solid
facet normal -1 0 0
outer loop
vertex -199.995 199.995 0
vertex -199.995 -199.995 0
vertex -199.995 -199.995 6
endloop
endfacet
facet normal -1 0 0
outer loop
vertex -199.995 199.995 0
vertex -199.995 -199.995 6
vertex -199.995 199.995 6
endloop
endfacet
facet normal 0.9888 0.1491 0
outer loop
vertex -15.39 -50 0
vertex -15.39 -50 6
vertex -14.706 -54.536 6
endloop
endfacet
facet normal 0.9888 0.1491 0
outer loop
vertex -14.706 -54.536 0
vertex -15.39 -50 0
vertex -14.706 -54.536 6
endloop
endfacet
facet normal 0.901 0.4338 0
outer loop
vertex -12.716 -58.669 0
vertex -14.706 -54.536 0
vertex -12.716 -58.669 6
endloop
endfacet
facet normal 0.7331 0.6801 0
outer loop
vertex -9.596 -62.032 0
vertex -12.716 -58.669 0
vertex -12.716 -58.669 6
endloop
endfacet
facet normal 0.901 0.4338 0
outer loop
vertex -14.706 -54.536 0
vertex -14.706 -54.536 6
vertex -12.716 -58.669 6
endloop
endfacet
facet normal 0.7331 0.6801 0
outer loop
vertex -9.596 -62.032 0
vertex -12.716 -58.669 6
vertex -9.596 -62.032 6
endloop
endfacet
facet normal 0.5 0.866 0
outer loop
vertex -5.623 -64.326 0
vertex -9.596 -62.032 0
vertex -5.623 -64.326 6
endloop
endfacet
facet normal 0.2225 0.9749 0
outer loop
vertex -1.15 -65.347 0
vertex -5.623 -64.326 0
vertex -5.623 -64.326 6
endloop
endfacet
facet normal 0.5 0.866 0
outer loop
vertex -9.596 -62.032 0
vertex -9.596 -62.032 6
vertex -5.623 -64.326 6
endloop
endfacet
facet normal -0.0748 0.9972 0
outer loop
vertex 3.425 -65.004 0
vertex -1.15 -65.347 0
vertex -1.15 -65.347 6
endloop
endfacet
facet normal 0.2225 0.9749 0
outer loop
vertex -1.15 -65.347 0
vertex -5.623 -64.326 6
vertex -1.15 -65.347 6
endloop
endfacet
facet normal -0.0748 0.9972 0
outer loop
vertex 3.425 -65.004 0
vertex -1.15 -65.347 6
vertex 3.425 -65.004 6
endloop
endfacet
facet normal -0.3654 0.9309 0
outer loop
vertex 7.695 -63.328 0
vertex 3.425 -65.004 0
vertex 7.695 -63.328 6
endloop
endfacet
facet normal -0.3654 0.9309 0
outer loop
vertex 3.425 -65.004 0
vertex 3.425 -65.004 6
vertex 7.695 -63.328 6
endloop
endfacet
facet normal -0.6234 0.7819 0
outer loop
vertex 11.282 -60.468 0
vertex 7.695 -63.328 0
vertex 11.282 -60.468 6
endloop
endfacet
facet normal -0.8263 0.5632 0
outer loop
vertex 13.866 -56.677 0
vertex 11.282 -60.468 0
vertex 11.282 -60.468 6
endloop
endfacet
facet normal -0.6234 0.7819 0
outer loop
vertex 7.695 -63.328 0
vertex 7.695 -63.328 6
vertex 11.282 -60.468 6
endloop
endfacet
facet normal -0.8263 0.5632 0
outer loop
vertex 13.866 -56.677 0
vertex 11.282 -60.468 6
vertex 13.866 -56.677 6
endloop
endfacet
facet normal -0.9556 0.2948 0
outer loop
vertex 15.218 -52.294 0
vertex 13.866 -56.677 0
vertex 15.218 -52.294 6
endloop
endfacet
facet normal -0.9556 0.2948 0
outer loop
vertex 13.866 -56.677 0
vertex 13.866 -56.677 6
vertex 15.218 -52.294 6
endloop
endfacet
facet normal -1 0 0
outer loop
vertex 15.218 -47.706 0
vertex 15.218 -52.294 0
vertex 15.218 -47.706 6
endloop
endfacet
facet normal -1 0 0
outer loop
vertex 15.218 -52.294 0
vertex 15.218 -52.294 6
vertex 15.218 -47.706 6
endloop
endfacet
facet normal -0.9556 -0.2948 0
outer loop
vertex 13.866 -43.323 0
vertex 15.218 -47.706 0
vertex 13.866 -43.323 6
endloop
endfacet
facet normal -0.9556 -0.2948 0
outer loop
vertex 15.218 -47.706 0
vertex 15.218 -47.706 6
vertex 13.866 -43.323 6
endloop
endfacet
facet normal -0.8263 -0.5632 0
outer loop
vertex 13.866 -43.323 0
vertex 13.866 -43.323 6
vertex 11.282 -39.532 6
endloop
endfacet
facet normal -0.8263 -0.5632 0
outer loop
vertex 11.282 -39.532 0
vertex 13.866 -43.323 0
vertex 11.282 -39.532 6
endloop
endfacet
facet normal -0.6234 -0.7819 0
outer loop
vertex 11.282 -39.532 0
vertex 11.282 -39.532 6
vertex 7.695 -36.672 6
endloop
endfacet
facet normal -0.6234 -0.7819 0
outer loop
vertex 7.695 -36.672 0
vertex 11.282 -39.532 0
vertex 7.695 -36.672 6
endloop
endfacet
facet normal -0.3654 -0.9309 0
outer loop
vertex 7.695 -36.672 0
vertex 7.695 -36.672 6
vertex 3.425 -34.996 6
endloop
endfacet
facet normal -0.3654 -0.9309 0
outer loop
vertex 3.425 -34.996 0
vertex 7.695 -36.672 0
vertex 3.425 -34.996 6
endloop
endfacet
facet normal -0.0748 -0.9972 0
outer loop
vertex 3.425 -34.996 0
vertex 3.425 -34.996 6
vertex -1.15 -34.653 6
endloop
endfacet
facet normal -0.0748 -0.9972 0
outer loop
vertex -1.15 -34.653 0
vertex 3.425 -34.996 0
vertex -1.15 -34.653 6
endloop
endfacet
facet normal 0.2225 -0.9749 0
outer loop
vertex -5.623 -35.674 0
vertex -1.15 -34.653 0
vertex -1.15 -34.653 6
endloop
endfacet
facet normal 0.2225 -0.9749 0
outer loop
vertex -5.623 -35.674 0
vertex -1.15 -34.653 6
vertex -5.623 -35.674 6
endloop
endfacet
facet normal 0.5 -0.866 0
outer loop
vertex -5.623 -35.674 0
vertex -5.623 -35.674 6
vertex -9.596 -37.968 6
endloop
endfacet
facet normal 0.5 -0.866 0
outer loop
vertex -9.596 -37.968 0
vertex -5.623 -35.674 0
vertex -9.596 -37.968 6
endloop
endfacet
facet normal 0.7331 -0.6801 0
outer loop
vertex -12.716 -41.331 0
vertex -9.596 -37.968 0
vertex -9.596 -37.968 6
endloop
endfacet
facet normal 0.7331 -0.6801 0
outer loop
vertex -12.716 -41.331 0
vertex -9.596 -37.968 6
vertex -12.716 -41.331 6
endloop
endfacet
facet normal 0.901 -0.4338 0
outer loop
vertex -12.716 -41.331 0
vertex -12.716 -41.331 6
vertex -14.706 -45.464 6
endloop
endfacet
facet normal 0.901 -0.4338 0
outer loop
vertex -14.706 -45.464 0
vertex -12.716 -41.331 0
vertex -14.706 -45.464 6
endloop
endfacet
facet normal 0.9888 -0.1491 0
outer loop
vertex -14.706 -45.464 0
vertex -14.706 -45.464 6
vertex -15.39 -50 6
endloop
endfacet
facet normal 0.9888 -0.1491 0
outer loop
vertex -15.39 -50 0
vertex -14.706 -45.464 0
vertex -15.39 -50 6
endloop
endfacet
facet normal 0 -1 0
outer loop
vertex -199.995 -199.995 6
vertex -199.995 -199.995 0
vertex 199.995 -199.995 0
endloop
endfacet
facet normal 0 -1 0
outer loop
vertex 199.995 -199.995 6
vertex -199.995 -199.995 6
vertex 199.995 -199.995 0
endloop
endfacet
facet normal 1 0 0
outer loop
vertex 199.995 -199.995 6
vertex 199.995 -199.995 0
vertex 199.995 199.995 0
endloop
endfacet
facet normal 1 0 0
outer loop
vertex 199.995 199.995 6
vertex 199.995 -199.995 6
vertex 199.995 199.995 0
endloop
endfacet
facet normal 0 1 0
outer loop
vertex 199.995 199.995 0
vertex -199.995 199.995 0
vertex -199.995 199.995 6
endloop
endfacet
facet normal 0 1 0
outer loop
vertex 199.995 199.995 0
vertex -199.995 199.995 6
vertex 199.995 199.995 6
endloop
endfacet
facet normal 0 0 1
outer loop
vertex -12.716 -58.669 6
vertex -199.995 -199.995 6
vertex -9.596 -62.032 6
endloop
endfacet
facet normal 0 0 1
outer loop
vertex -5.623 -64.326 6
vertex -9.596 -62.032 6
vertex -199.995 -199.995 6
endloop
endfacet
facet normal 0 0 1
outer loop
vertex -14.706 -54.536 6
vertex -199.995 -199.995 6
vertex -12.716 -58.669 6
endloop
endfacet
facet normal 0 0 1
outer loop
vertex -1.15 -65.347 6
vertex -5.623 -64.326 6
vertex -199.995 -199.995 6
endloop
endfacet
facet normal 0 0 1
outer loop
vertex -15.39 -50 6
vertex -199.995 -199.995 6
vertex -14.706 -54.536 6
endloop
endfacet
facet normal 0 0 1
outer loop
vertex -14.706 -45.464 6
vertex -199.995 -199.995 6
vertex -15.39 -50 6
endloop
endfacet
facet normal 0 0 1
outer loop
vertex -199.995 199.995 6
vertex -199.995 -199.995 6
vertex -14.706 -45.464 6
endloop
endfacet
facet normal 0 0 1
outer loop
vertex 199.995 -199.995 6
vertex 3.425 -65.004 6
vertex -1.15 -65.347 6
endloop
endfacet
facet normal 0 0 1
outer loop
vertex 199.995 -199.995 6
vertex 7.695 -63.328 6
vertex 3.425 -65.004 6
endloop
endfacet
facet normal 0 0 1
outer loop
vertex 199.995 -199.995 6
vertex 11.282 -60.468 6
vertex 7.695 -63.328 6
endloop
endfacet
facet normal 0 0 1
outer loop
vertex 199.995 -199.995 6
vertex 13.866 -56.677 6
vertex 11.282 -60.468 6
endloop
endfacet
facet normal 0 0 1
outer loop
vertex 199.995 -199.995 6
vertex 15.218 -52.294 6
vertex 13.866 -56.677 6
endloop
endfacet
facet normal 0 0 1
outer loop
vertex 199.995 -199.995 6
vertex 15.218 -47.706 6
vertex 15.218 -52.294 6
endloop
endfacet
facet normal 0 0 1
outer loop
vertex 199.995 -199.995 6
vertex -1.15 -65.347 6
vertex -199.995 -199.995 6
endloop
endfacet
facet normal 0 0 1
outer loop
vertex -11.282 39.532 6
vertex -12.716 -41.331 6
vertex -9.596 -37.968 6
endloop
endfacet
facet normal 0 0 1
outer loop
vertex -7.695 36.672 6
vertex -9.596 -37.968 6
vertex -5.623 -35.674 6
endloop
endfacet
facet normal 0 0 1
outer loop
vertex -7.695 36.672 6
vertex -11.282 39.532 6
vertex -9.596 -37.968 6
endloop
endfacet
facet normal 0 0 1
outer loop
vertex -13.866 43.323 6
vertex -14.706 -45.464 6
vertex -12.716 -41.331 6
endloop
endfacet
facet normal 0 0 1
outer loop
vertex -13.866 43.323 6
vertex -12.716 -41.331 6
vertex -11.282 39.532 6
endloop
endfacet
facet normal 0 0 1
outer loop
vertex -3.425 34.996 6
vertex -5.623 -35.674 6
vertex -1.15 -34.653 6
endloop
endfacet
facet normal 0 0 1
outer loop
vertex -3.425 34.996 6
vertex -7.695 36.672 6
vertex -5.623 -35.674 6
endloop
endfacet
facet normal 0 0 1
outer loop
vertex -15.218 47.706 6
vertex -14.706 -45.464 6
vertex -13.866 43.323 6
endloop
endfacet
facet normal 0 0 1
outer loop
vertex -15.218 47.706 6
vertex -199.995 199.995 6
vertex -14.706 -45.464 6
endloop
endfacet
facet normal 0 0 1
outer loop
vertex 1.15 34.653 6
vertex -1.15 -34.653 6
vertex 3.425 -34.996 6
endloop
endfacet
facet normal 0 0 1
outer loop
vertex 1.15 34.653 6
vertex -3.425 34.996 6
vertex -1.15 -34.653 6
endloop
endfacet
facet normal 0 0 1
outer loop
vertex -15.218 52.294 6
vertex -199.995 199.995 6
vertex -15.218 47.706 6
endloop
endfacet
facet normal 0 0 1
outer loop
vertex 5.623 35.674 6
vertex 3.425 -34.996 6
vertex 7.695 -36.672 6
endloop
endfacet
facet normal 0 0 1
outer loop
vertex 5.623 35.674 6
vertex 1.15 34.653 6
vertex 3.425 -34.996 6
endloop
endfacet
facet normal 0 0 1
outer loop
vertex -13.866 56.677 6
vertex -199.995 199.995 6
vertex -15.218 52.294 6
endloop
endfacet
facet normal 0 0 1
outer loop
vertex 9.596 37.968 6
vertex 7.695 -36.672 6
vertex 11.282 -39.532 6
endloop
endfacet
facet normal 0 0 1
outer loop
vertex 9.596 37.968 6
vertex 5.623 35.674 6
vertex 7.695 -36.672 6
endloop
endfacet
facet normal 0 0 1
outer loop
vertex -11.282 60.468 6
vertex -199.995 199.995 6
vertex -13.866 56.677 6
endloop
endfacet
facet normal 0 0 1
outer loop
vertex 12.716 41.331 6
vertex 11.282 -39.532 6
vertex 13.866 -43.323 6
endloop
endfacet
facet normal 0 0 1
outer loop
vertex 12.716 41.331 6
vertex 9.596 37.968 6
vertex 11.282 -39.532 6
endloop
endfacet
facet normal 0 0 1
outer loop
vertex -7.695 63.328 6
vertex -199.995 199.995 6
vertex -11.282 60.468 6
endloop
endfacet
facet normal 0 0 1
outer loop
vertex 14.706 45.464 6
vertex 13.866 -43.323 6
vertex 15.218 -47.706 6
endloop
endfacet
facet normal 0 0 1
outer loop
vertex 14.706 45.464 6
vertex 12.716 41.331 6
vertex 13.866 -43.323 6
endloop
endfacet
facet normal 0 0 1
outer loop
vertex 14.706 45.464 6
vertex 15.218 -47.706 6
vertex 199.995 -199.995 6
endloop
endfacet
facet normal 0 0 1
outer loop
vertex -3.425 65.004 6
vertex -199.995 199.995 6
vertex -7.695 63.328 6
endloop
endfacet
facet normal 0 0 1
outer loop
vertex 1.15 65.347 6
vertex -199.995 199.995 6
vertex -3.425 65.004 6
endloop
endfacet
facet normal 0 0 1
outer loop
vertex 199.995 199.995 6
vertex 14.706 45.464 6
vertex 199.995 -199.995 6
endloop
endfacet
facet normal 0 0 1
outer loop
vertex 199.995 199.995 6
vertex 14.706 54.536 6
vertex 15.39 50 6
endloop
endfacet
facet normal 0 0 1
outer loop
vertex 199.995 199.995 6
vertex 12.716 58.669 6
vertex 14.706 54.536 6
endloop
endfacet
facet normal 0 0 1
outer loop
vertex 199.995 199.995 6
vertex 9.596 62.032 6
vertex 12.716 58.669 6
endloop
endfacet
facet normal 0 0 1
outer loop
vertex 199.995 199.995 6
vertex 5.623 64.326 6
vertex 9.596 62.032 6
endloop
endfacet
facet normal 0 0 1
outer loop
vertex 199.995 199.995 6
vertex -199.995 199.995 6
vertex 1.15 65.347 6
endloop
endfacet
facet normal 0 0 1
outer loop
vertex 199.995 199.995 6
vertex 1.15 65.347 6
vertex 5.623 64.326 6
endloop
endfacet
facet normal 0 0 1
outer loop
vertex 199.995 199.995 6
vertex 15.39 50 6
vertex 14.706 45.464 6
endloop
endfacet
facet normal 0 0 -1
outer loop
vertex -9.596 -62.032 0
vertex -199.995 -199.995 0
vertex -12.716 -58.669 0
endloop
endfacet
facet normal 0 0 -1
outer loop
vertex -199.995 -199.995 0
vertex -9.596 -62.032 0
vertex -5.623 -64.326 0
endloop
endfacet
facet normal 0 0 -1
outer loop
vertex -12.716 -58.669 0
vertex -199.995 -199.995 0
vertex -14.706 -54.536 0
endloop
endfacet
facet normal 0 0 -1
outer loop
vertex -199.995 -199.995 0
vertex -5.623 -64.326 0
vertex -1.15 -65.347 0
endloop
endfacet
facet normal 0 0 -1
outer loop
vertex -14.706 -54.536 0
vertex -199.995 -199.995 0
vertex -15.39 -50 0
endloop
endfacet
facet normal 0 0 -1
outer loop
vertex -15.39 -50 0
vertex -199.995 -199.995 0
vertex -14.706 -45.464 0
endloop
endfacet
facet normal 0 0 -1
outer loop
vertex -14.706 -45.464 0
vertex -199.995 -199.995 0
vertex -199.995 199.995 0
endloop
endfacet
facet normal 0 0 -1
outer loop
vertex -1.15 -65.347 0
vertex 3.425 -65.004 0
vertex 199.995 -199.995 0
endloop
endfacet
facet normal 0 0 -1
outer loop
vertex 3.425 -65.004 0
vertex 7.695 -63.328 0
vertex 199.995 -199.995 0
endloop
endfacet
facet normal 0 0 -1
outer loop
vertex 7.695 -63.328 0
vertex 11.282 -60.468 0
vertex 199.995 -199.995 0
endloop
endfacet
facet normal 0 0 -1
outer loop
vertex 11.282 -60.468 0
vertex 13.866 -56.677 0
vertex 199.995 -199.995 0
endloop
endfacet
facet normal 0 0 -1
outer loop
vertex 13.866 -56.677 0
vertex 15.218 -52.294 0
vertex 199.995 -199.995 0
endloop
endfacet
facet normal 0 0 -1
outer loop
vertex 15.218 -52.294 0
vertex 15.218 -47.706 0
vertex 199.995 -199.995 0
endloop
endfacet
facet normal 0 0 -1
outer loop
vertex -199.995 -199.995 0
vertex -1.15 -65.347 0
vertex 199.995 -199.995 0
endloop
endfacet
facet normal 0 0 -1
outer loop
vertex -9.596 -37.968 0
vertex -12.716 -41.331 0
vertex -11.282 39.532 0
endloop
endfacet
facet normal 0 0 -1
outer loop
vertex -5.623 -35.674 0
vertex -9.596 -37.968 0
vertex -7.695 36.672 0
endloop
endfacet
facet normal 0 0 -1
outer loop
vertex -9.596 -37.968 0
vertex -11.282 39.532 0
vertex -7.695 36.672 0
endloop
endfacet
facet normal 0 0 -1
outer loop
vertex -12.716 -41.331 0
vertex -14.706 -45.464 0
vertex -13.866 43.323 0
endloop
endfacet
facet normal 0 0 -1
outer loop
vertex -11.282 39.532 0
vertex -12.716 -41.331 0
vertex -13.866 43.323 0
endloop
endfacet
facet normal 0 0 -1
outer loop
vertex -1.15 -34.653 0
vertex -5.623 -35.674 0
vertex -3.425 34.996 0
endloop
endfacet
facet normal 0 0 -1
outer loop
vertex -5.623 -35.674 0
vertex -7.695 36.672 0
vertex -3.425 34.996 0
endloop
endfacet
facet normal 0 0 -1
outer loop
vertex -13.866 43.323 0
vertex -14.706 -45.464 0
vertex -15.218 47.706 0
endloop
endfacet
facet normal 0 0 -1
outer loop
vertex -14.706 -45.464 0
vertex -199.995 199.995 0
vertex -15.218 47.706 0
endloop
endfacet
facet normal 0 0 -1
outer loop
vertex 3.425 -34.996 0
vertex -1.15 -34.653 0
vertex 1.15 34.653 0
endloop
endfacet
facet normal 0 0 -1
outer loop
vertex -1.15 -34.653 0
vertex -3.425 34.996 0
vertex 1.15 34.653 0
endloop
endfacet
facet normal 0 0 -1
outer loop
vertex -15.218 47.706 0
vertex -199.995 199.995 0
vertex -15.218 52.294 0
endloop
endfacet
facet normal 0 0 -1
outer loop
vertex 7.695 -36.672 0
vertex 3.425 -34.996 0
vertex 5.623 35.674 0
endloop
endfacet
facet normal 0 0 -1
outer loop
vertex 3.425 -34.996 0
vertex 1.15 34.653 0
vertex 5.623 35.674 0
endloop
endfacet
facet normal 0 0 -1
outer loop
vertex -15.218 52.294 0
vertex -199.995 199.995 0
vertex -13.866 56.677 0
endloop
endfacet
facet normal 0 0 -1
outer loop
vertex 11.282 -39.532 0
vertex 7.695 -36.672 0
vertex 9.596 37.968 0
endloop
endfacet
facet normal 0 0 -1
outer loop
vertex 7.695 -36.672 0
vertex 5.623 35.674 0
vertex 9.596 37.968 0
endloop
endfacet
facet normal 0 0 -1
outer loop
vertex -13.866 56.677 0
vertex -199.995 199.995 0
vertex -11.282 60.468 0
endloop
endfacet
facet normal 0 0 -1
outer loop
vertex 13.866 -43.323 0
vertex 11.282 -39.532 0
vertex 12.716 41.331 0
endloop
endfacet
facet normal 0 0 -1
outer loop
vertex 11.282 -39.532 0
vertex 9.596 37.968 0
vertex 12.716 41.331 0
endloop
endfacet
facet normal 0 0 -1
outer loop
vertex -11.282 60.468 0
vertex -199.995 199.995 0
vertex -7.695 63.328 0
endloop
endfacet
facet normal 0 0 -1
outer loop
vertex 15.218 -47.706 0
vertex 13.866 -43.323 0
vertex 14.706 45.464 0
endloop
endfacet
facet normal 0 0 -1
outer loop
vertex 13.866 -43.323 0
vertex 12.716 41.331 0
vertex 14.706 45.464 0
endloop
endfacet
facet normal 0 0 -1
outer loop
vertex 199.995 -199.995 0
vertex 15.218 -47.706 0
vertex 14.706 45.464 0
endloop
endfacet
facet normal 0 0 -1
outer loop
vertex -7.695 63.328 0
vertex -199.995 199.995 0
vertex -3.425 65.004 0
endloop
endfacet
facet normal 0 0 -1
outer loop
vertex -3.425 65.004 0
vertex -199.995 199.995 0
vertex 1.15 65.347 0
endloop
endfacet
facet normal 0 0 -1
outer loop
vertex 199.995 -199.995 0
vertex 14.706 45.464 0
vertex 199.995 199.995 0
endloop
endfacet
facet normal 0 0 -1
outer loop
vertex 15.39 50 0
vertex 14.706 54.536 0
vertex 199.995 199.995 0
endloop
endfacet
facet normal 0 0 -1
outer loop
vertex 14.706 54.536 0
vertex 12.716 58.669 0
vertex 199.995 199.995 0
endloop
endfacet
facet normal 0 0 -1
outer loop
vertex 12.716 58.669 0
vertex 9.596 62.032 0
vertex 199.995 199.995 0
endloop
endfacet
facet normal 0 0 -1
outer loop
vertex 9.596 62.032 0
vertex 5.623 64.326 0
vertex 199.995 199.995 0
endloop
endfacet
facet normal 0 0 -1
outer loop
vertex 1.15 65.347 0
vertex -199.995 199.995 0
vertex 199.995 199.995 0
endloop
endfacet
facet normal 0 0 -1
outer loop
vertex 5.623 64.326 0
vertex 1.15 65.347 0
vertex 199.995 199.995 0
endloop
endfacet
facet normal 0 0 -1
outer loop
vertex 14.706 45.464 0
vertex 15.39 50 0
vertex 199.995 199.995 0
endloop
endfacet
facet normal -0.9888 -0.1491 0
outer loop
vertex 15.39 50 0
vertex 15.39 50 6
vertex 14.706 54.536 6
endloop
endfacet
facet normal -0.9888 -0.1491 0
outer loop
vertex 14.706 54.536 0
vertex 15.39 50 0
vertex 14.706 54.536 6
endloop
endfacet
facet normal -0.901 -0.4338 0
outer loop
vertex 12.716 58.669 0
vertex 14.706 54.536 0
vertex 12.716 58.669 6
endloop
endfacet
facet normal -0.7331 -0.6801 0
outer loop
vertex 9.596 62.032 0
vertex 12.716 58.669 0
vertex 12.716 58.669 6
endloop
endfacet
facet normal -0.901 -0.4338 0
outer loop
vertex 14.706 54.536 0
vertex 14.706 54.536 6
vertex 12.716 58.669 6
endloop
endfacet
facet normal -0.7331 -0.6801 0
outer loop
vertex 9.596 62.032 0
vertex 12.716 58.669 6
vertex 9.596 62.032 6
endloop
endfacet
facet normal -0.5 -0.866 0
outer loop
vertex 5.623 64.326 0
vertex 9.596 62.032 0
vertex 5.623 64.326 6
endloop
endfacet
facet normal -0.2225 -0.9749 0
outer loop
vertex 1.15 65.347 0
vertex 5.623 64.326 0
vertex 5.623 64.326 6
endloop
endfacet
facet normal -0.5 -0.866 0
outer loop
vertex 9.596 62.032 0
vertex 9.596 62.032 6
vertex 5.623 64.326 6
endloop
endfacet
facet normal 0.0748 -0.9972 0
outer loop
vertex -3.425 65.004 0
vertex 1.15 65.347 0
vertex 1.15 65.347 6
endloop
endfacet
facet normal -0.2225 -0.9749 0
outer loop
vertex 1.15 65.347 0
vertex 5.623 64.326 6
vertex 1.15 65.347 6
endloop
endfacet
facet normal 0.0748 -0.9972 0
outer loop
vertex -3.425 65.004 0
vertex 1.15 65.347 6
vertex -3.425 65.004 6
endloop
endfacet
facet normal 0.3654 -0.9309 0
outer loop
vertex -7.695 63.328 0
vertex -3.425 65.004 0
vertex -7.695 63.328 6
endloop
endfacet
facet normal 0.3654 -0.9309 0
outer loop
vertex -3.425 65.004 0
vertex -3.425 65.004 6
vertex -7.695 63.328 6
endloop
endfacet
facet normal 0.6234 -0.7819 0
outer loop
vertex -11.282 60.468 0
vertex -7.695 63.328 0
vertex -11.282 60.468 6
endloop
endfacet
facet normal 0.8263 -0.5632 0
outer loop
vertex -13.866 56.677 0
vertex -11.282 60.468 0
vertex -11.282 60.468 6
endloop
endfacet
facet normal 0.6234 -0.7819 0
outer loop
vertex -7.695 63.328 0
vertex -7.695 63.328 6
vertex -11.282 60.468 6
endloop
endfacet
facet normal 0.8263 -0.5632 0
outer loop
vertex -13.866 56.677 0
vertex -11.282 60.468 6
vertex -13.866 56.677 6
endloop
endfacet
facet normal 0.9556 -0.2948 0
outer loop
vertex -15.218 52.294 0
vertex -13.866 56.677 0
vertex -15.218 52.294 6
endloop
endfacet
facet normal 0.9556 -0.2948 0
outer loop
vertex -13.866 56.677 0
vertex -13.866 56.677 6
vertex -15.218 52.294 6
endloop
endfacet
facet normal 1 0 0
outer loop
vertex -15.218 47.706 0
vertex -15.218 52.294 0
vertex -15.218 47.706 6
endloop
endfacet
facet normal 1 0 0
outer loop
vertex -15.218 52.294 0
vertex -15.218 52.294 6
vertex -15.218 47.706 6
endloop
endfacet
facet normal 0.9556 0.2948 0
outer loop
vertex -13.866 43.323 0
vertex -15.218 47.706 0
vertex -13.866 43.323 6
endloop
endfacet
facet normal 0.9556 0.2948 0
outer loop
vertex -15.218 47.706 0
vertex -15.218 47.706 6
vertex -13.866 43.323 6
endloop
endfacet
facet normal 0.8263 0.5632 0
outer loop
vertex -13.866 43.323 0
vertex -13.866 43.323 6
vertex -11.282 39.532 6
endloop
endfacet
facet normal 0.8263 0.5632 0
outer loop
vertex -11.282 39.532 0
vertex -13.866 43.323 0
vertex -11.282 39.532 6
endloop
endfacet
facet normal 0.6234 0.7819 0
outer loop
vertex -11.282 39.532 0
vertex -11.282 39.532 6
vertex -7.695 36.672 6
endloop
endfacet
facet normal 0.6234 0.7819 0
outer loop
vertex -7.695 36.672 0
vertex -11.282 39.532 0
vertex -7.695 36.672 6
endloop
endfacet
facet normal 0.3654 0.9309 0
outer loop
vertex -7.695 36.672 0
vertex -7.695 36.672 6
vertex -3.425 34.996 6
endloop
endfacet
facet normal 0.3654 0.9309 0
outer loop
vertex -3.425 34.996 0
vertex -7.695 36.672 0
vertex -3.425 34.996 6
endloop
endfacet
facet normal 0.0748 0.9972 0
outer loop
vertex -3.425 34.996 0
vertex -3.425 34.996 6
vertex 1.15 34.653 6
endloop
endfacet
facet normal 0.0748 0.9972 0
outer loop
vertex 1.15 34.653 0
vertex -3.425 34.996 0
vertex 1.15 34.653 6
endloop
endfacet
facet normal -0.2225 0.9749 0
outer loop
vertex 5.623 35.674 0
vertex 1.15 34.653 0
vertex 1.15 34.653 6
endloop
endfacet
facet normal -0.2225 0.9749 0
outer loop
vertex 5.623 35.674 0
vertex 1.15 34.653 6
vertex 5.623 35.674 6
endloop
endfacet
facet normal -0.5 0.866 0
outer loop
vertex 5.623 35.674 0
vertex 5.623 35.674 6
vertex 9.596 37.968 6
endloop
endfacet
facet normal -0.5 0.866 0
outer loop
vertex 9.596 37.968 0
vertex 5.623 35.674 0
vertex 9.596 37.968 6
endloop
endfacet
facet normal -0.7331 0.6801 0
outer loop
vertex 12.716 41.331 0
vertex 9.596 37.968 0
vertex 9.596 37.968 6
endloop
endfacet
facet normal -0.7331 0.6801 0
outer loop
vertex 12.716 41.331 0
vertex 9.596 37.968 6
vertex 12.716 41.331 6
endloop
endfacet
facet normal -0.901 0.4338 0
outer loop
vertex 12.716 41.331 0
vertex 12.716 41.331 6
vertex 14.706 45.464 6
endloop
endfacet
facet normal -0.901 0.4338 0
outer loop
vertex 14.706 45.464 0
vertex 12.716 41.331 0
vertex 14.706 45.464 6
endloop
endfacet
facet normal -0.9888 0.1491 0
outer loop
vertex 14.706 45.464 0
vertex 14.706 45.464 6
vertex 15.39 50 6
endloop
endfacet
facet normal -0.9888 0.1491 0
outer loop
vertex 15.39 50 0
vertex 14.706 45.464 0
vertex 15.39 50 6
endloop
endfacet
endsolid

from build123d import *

# Parameters (mm, degrees)
SKETCH_W              = 399.99
SKETCH_H              = 399.99
PAD_DEPTH             = 6
SKETCH001_R           = 15.39
POCKET_DEPTH          = 1137.407205
POLARPATTERN001_COUNT = 2


with BuildPart() as part:
    # Sketch → Pad (new body)
    with BuildSketch(Plane.XY):
        Rectangle(SKETCH_W, SKETCH_H)
    extrude(amount=PAD_DEPTH)

    # Sketch001 (on Face6 of Pad) → Pocket (cut, through all)
    with BuildSketch(Plane.XY.offset(6)):
        with Locations((0, 50)):
            Circle(SKETCH001_R)
    pocket = extrude(amount=-POCKET_DEPTH, mode=Mode.SUBTRACT)

    # PolarPattern001: Pocket ×2 about axis
    polarpattern001_axis = Axis((0, 0, 6), (0, 0, 1))
    for i in range(1, POLARPATTERN001_COUNT):
        add(pocket.rotate(polarpattern001_axis, i * 360 / POLARPATTERN001_COUNT), mode=Mode.SUBTRACT)


solid = part.part
